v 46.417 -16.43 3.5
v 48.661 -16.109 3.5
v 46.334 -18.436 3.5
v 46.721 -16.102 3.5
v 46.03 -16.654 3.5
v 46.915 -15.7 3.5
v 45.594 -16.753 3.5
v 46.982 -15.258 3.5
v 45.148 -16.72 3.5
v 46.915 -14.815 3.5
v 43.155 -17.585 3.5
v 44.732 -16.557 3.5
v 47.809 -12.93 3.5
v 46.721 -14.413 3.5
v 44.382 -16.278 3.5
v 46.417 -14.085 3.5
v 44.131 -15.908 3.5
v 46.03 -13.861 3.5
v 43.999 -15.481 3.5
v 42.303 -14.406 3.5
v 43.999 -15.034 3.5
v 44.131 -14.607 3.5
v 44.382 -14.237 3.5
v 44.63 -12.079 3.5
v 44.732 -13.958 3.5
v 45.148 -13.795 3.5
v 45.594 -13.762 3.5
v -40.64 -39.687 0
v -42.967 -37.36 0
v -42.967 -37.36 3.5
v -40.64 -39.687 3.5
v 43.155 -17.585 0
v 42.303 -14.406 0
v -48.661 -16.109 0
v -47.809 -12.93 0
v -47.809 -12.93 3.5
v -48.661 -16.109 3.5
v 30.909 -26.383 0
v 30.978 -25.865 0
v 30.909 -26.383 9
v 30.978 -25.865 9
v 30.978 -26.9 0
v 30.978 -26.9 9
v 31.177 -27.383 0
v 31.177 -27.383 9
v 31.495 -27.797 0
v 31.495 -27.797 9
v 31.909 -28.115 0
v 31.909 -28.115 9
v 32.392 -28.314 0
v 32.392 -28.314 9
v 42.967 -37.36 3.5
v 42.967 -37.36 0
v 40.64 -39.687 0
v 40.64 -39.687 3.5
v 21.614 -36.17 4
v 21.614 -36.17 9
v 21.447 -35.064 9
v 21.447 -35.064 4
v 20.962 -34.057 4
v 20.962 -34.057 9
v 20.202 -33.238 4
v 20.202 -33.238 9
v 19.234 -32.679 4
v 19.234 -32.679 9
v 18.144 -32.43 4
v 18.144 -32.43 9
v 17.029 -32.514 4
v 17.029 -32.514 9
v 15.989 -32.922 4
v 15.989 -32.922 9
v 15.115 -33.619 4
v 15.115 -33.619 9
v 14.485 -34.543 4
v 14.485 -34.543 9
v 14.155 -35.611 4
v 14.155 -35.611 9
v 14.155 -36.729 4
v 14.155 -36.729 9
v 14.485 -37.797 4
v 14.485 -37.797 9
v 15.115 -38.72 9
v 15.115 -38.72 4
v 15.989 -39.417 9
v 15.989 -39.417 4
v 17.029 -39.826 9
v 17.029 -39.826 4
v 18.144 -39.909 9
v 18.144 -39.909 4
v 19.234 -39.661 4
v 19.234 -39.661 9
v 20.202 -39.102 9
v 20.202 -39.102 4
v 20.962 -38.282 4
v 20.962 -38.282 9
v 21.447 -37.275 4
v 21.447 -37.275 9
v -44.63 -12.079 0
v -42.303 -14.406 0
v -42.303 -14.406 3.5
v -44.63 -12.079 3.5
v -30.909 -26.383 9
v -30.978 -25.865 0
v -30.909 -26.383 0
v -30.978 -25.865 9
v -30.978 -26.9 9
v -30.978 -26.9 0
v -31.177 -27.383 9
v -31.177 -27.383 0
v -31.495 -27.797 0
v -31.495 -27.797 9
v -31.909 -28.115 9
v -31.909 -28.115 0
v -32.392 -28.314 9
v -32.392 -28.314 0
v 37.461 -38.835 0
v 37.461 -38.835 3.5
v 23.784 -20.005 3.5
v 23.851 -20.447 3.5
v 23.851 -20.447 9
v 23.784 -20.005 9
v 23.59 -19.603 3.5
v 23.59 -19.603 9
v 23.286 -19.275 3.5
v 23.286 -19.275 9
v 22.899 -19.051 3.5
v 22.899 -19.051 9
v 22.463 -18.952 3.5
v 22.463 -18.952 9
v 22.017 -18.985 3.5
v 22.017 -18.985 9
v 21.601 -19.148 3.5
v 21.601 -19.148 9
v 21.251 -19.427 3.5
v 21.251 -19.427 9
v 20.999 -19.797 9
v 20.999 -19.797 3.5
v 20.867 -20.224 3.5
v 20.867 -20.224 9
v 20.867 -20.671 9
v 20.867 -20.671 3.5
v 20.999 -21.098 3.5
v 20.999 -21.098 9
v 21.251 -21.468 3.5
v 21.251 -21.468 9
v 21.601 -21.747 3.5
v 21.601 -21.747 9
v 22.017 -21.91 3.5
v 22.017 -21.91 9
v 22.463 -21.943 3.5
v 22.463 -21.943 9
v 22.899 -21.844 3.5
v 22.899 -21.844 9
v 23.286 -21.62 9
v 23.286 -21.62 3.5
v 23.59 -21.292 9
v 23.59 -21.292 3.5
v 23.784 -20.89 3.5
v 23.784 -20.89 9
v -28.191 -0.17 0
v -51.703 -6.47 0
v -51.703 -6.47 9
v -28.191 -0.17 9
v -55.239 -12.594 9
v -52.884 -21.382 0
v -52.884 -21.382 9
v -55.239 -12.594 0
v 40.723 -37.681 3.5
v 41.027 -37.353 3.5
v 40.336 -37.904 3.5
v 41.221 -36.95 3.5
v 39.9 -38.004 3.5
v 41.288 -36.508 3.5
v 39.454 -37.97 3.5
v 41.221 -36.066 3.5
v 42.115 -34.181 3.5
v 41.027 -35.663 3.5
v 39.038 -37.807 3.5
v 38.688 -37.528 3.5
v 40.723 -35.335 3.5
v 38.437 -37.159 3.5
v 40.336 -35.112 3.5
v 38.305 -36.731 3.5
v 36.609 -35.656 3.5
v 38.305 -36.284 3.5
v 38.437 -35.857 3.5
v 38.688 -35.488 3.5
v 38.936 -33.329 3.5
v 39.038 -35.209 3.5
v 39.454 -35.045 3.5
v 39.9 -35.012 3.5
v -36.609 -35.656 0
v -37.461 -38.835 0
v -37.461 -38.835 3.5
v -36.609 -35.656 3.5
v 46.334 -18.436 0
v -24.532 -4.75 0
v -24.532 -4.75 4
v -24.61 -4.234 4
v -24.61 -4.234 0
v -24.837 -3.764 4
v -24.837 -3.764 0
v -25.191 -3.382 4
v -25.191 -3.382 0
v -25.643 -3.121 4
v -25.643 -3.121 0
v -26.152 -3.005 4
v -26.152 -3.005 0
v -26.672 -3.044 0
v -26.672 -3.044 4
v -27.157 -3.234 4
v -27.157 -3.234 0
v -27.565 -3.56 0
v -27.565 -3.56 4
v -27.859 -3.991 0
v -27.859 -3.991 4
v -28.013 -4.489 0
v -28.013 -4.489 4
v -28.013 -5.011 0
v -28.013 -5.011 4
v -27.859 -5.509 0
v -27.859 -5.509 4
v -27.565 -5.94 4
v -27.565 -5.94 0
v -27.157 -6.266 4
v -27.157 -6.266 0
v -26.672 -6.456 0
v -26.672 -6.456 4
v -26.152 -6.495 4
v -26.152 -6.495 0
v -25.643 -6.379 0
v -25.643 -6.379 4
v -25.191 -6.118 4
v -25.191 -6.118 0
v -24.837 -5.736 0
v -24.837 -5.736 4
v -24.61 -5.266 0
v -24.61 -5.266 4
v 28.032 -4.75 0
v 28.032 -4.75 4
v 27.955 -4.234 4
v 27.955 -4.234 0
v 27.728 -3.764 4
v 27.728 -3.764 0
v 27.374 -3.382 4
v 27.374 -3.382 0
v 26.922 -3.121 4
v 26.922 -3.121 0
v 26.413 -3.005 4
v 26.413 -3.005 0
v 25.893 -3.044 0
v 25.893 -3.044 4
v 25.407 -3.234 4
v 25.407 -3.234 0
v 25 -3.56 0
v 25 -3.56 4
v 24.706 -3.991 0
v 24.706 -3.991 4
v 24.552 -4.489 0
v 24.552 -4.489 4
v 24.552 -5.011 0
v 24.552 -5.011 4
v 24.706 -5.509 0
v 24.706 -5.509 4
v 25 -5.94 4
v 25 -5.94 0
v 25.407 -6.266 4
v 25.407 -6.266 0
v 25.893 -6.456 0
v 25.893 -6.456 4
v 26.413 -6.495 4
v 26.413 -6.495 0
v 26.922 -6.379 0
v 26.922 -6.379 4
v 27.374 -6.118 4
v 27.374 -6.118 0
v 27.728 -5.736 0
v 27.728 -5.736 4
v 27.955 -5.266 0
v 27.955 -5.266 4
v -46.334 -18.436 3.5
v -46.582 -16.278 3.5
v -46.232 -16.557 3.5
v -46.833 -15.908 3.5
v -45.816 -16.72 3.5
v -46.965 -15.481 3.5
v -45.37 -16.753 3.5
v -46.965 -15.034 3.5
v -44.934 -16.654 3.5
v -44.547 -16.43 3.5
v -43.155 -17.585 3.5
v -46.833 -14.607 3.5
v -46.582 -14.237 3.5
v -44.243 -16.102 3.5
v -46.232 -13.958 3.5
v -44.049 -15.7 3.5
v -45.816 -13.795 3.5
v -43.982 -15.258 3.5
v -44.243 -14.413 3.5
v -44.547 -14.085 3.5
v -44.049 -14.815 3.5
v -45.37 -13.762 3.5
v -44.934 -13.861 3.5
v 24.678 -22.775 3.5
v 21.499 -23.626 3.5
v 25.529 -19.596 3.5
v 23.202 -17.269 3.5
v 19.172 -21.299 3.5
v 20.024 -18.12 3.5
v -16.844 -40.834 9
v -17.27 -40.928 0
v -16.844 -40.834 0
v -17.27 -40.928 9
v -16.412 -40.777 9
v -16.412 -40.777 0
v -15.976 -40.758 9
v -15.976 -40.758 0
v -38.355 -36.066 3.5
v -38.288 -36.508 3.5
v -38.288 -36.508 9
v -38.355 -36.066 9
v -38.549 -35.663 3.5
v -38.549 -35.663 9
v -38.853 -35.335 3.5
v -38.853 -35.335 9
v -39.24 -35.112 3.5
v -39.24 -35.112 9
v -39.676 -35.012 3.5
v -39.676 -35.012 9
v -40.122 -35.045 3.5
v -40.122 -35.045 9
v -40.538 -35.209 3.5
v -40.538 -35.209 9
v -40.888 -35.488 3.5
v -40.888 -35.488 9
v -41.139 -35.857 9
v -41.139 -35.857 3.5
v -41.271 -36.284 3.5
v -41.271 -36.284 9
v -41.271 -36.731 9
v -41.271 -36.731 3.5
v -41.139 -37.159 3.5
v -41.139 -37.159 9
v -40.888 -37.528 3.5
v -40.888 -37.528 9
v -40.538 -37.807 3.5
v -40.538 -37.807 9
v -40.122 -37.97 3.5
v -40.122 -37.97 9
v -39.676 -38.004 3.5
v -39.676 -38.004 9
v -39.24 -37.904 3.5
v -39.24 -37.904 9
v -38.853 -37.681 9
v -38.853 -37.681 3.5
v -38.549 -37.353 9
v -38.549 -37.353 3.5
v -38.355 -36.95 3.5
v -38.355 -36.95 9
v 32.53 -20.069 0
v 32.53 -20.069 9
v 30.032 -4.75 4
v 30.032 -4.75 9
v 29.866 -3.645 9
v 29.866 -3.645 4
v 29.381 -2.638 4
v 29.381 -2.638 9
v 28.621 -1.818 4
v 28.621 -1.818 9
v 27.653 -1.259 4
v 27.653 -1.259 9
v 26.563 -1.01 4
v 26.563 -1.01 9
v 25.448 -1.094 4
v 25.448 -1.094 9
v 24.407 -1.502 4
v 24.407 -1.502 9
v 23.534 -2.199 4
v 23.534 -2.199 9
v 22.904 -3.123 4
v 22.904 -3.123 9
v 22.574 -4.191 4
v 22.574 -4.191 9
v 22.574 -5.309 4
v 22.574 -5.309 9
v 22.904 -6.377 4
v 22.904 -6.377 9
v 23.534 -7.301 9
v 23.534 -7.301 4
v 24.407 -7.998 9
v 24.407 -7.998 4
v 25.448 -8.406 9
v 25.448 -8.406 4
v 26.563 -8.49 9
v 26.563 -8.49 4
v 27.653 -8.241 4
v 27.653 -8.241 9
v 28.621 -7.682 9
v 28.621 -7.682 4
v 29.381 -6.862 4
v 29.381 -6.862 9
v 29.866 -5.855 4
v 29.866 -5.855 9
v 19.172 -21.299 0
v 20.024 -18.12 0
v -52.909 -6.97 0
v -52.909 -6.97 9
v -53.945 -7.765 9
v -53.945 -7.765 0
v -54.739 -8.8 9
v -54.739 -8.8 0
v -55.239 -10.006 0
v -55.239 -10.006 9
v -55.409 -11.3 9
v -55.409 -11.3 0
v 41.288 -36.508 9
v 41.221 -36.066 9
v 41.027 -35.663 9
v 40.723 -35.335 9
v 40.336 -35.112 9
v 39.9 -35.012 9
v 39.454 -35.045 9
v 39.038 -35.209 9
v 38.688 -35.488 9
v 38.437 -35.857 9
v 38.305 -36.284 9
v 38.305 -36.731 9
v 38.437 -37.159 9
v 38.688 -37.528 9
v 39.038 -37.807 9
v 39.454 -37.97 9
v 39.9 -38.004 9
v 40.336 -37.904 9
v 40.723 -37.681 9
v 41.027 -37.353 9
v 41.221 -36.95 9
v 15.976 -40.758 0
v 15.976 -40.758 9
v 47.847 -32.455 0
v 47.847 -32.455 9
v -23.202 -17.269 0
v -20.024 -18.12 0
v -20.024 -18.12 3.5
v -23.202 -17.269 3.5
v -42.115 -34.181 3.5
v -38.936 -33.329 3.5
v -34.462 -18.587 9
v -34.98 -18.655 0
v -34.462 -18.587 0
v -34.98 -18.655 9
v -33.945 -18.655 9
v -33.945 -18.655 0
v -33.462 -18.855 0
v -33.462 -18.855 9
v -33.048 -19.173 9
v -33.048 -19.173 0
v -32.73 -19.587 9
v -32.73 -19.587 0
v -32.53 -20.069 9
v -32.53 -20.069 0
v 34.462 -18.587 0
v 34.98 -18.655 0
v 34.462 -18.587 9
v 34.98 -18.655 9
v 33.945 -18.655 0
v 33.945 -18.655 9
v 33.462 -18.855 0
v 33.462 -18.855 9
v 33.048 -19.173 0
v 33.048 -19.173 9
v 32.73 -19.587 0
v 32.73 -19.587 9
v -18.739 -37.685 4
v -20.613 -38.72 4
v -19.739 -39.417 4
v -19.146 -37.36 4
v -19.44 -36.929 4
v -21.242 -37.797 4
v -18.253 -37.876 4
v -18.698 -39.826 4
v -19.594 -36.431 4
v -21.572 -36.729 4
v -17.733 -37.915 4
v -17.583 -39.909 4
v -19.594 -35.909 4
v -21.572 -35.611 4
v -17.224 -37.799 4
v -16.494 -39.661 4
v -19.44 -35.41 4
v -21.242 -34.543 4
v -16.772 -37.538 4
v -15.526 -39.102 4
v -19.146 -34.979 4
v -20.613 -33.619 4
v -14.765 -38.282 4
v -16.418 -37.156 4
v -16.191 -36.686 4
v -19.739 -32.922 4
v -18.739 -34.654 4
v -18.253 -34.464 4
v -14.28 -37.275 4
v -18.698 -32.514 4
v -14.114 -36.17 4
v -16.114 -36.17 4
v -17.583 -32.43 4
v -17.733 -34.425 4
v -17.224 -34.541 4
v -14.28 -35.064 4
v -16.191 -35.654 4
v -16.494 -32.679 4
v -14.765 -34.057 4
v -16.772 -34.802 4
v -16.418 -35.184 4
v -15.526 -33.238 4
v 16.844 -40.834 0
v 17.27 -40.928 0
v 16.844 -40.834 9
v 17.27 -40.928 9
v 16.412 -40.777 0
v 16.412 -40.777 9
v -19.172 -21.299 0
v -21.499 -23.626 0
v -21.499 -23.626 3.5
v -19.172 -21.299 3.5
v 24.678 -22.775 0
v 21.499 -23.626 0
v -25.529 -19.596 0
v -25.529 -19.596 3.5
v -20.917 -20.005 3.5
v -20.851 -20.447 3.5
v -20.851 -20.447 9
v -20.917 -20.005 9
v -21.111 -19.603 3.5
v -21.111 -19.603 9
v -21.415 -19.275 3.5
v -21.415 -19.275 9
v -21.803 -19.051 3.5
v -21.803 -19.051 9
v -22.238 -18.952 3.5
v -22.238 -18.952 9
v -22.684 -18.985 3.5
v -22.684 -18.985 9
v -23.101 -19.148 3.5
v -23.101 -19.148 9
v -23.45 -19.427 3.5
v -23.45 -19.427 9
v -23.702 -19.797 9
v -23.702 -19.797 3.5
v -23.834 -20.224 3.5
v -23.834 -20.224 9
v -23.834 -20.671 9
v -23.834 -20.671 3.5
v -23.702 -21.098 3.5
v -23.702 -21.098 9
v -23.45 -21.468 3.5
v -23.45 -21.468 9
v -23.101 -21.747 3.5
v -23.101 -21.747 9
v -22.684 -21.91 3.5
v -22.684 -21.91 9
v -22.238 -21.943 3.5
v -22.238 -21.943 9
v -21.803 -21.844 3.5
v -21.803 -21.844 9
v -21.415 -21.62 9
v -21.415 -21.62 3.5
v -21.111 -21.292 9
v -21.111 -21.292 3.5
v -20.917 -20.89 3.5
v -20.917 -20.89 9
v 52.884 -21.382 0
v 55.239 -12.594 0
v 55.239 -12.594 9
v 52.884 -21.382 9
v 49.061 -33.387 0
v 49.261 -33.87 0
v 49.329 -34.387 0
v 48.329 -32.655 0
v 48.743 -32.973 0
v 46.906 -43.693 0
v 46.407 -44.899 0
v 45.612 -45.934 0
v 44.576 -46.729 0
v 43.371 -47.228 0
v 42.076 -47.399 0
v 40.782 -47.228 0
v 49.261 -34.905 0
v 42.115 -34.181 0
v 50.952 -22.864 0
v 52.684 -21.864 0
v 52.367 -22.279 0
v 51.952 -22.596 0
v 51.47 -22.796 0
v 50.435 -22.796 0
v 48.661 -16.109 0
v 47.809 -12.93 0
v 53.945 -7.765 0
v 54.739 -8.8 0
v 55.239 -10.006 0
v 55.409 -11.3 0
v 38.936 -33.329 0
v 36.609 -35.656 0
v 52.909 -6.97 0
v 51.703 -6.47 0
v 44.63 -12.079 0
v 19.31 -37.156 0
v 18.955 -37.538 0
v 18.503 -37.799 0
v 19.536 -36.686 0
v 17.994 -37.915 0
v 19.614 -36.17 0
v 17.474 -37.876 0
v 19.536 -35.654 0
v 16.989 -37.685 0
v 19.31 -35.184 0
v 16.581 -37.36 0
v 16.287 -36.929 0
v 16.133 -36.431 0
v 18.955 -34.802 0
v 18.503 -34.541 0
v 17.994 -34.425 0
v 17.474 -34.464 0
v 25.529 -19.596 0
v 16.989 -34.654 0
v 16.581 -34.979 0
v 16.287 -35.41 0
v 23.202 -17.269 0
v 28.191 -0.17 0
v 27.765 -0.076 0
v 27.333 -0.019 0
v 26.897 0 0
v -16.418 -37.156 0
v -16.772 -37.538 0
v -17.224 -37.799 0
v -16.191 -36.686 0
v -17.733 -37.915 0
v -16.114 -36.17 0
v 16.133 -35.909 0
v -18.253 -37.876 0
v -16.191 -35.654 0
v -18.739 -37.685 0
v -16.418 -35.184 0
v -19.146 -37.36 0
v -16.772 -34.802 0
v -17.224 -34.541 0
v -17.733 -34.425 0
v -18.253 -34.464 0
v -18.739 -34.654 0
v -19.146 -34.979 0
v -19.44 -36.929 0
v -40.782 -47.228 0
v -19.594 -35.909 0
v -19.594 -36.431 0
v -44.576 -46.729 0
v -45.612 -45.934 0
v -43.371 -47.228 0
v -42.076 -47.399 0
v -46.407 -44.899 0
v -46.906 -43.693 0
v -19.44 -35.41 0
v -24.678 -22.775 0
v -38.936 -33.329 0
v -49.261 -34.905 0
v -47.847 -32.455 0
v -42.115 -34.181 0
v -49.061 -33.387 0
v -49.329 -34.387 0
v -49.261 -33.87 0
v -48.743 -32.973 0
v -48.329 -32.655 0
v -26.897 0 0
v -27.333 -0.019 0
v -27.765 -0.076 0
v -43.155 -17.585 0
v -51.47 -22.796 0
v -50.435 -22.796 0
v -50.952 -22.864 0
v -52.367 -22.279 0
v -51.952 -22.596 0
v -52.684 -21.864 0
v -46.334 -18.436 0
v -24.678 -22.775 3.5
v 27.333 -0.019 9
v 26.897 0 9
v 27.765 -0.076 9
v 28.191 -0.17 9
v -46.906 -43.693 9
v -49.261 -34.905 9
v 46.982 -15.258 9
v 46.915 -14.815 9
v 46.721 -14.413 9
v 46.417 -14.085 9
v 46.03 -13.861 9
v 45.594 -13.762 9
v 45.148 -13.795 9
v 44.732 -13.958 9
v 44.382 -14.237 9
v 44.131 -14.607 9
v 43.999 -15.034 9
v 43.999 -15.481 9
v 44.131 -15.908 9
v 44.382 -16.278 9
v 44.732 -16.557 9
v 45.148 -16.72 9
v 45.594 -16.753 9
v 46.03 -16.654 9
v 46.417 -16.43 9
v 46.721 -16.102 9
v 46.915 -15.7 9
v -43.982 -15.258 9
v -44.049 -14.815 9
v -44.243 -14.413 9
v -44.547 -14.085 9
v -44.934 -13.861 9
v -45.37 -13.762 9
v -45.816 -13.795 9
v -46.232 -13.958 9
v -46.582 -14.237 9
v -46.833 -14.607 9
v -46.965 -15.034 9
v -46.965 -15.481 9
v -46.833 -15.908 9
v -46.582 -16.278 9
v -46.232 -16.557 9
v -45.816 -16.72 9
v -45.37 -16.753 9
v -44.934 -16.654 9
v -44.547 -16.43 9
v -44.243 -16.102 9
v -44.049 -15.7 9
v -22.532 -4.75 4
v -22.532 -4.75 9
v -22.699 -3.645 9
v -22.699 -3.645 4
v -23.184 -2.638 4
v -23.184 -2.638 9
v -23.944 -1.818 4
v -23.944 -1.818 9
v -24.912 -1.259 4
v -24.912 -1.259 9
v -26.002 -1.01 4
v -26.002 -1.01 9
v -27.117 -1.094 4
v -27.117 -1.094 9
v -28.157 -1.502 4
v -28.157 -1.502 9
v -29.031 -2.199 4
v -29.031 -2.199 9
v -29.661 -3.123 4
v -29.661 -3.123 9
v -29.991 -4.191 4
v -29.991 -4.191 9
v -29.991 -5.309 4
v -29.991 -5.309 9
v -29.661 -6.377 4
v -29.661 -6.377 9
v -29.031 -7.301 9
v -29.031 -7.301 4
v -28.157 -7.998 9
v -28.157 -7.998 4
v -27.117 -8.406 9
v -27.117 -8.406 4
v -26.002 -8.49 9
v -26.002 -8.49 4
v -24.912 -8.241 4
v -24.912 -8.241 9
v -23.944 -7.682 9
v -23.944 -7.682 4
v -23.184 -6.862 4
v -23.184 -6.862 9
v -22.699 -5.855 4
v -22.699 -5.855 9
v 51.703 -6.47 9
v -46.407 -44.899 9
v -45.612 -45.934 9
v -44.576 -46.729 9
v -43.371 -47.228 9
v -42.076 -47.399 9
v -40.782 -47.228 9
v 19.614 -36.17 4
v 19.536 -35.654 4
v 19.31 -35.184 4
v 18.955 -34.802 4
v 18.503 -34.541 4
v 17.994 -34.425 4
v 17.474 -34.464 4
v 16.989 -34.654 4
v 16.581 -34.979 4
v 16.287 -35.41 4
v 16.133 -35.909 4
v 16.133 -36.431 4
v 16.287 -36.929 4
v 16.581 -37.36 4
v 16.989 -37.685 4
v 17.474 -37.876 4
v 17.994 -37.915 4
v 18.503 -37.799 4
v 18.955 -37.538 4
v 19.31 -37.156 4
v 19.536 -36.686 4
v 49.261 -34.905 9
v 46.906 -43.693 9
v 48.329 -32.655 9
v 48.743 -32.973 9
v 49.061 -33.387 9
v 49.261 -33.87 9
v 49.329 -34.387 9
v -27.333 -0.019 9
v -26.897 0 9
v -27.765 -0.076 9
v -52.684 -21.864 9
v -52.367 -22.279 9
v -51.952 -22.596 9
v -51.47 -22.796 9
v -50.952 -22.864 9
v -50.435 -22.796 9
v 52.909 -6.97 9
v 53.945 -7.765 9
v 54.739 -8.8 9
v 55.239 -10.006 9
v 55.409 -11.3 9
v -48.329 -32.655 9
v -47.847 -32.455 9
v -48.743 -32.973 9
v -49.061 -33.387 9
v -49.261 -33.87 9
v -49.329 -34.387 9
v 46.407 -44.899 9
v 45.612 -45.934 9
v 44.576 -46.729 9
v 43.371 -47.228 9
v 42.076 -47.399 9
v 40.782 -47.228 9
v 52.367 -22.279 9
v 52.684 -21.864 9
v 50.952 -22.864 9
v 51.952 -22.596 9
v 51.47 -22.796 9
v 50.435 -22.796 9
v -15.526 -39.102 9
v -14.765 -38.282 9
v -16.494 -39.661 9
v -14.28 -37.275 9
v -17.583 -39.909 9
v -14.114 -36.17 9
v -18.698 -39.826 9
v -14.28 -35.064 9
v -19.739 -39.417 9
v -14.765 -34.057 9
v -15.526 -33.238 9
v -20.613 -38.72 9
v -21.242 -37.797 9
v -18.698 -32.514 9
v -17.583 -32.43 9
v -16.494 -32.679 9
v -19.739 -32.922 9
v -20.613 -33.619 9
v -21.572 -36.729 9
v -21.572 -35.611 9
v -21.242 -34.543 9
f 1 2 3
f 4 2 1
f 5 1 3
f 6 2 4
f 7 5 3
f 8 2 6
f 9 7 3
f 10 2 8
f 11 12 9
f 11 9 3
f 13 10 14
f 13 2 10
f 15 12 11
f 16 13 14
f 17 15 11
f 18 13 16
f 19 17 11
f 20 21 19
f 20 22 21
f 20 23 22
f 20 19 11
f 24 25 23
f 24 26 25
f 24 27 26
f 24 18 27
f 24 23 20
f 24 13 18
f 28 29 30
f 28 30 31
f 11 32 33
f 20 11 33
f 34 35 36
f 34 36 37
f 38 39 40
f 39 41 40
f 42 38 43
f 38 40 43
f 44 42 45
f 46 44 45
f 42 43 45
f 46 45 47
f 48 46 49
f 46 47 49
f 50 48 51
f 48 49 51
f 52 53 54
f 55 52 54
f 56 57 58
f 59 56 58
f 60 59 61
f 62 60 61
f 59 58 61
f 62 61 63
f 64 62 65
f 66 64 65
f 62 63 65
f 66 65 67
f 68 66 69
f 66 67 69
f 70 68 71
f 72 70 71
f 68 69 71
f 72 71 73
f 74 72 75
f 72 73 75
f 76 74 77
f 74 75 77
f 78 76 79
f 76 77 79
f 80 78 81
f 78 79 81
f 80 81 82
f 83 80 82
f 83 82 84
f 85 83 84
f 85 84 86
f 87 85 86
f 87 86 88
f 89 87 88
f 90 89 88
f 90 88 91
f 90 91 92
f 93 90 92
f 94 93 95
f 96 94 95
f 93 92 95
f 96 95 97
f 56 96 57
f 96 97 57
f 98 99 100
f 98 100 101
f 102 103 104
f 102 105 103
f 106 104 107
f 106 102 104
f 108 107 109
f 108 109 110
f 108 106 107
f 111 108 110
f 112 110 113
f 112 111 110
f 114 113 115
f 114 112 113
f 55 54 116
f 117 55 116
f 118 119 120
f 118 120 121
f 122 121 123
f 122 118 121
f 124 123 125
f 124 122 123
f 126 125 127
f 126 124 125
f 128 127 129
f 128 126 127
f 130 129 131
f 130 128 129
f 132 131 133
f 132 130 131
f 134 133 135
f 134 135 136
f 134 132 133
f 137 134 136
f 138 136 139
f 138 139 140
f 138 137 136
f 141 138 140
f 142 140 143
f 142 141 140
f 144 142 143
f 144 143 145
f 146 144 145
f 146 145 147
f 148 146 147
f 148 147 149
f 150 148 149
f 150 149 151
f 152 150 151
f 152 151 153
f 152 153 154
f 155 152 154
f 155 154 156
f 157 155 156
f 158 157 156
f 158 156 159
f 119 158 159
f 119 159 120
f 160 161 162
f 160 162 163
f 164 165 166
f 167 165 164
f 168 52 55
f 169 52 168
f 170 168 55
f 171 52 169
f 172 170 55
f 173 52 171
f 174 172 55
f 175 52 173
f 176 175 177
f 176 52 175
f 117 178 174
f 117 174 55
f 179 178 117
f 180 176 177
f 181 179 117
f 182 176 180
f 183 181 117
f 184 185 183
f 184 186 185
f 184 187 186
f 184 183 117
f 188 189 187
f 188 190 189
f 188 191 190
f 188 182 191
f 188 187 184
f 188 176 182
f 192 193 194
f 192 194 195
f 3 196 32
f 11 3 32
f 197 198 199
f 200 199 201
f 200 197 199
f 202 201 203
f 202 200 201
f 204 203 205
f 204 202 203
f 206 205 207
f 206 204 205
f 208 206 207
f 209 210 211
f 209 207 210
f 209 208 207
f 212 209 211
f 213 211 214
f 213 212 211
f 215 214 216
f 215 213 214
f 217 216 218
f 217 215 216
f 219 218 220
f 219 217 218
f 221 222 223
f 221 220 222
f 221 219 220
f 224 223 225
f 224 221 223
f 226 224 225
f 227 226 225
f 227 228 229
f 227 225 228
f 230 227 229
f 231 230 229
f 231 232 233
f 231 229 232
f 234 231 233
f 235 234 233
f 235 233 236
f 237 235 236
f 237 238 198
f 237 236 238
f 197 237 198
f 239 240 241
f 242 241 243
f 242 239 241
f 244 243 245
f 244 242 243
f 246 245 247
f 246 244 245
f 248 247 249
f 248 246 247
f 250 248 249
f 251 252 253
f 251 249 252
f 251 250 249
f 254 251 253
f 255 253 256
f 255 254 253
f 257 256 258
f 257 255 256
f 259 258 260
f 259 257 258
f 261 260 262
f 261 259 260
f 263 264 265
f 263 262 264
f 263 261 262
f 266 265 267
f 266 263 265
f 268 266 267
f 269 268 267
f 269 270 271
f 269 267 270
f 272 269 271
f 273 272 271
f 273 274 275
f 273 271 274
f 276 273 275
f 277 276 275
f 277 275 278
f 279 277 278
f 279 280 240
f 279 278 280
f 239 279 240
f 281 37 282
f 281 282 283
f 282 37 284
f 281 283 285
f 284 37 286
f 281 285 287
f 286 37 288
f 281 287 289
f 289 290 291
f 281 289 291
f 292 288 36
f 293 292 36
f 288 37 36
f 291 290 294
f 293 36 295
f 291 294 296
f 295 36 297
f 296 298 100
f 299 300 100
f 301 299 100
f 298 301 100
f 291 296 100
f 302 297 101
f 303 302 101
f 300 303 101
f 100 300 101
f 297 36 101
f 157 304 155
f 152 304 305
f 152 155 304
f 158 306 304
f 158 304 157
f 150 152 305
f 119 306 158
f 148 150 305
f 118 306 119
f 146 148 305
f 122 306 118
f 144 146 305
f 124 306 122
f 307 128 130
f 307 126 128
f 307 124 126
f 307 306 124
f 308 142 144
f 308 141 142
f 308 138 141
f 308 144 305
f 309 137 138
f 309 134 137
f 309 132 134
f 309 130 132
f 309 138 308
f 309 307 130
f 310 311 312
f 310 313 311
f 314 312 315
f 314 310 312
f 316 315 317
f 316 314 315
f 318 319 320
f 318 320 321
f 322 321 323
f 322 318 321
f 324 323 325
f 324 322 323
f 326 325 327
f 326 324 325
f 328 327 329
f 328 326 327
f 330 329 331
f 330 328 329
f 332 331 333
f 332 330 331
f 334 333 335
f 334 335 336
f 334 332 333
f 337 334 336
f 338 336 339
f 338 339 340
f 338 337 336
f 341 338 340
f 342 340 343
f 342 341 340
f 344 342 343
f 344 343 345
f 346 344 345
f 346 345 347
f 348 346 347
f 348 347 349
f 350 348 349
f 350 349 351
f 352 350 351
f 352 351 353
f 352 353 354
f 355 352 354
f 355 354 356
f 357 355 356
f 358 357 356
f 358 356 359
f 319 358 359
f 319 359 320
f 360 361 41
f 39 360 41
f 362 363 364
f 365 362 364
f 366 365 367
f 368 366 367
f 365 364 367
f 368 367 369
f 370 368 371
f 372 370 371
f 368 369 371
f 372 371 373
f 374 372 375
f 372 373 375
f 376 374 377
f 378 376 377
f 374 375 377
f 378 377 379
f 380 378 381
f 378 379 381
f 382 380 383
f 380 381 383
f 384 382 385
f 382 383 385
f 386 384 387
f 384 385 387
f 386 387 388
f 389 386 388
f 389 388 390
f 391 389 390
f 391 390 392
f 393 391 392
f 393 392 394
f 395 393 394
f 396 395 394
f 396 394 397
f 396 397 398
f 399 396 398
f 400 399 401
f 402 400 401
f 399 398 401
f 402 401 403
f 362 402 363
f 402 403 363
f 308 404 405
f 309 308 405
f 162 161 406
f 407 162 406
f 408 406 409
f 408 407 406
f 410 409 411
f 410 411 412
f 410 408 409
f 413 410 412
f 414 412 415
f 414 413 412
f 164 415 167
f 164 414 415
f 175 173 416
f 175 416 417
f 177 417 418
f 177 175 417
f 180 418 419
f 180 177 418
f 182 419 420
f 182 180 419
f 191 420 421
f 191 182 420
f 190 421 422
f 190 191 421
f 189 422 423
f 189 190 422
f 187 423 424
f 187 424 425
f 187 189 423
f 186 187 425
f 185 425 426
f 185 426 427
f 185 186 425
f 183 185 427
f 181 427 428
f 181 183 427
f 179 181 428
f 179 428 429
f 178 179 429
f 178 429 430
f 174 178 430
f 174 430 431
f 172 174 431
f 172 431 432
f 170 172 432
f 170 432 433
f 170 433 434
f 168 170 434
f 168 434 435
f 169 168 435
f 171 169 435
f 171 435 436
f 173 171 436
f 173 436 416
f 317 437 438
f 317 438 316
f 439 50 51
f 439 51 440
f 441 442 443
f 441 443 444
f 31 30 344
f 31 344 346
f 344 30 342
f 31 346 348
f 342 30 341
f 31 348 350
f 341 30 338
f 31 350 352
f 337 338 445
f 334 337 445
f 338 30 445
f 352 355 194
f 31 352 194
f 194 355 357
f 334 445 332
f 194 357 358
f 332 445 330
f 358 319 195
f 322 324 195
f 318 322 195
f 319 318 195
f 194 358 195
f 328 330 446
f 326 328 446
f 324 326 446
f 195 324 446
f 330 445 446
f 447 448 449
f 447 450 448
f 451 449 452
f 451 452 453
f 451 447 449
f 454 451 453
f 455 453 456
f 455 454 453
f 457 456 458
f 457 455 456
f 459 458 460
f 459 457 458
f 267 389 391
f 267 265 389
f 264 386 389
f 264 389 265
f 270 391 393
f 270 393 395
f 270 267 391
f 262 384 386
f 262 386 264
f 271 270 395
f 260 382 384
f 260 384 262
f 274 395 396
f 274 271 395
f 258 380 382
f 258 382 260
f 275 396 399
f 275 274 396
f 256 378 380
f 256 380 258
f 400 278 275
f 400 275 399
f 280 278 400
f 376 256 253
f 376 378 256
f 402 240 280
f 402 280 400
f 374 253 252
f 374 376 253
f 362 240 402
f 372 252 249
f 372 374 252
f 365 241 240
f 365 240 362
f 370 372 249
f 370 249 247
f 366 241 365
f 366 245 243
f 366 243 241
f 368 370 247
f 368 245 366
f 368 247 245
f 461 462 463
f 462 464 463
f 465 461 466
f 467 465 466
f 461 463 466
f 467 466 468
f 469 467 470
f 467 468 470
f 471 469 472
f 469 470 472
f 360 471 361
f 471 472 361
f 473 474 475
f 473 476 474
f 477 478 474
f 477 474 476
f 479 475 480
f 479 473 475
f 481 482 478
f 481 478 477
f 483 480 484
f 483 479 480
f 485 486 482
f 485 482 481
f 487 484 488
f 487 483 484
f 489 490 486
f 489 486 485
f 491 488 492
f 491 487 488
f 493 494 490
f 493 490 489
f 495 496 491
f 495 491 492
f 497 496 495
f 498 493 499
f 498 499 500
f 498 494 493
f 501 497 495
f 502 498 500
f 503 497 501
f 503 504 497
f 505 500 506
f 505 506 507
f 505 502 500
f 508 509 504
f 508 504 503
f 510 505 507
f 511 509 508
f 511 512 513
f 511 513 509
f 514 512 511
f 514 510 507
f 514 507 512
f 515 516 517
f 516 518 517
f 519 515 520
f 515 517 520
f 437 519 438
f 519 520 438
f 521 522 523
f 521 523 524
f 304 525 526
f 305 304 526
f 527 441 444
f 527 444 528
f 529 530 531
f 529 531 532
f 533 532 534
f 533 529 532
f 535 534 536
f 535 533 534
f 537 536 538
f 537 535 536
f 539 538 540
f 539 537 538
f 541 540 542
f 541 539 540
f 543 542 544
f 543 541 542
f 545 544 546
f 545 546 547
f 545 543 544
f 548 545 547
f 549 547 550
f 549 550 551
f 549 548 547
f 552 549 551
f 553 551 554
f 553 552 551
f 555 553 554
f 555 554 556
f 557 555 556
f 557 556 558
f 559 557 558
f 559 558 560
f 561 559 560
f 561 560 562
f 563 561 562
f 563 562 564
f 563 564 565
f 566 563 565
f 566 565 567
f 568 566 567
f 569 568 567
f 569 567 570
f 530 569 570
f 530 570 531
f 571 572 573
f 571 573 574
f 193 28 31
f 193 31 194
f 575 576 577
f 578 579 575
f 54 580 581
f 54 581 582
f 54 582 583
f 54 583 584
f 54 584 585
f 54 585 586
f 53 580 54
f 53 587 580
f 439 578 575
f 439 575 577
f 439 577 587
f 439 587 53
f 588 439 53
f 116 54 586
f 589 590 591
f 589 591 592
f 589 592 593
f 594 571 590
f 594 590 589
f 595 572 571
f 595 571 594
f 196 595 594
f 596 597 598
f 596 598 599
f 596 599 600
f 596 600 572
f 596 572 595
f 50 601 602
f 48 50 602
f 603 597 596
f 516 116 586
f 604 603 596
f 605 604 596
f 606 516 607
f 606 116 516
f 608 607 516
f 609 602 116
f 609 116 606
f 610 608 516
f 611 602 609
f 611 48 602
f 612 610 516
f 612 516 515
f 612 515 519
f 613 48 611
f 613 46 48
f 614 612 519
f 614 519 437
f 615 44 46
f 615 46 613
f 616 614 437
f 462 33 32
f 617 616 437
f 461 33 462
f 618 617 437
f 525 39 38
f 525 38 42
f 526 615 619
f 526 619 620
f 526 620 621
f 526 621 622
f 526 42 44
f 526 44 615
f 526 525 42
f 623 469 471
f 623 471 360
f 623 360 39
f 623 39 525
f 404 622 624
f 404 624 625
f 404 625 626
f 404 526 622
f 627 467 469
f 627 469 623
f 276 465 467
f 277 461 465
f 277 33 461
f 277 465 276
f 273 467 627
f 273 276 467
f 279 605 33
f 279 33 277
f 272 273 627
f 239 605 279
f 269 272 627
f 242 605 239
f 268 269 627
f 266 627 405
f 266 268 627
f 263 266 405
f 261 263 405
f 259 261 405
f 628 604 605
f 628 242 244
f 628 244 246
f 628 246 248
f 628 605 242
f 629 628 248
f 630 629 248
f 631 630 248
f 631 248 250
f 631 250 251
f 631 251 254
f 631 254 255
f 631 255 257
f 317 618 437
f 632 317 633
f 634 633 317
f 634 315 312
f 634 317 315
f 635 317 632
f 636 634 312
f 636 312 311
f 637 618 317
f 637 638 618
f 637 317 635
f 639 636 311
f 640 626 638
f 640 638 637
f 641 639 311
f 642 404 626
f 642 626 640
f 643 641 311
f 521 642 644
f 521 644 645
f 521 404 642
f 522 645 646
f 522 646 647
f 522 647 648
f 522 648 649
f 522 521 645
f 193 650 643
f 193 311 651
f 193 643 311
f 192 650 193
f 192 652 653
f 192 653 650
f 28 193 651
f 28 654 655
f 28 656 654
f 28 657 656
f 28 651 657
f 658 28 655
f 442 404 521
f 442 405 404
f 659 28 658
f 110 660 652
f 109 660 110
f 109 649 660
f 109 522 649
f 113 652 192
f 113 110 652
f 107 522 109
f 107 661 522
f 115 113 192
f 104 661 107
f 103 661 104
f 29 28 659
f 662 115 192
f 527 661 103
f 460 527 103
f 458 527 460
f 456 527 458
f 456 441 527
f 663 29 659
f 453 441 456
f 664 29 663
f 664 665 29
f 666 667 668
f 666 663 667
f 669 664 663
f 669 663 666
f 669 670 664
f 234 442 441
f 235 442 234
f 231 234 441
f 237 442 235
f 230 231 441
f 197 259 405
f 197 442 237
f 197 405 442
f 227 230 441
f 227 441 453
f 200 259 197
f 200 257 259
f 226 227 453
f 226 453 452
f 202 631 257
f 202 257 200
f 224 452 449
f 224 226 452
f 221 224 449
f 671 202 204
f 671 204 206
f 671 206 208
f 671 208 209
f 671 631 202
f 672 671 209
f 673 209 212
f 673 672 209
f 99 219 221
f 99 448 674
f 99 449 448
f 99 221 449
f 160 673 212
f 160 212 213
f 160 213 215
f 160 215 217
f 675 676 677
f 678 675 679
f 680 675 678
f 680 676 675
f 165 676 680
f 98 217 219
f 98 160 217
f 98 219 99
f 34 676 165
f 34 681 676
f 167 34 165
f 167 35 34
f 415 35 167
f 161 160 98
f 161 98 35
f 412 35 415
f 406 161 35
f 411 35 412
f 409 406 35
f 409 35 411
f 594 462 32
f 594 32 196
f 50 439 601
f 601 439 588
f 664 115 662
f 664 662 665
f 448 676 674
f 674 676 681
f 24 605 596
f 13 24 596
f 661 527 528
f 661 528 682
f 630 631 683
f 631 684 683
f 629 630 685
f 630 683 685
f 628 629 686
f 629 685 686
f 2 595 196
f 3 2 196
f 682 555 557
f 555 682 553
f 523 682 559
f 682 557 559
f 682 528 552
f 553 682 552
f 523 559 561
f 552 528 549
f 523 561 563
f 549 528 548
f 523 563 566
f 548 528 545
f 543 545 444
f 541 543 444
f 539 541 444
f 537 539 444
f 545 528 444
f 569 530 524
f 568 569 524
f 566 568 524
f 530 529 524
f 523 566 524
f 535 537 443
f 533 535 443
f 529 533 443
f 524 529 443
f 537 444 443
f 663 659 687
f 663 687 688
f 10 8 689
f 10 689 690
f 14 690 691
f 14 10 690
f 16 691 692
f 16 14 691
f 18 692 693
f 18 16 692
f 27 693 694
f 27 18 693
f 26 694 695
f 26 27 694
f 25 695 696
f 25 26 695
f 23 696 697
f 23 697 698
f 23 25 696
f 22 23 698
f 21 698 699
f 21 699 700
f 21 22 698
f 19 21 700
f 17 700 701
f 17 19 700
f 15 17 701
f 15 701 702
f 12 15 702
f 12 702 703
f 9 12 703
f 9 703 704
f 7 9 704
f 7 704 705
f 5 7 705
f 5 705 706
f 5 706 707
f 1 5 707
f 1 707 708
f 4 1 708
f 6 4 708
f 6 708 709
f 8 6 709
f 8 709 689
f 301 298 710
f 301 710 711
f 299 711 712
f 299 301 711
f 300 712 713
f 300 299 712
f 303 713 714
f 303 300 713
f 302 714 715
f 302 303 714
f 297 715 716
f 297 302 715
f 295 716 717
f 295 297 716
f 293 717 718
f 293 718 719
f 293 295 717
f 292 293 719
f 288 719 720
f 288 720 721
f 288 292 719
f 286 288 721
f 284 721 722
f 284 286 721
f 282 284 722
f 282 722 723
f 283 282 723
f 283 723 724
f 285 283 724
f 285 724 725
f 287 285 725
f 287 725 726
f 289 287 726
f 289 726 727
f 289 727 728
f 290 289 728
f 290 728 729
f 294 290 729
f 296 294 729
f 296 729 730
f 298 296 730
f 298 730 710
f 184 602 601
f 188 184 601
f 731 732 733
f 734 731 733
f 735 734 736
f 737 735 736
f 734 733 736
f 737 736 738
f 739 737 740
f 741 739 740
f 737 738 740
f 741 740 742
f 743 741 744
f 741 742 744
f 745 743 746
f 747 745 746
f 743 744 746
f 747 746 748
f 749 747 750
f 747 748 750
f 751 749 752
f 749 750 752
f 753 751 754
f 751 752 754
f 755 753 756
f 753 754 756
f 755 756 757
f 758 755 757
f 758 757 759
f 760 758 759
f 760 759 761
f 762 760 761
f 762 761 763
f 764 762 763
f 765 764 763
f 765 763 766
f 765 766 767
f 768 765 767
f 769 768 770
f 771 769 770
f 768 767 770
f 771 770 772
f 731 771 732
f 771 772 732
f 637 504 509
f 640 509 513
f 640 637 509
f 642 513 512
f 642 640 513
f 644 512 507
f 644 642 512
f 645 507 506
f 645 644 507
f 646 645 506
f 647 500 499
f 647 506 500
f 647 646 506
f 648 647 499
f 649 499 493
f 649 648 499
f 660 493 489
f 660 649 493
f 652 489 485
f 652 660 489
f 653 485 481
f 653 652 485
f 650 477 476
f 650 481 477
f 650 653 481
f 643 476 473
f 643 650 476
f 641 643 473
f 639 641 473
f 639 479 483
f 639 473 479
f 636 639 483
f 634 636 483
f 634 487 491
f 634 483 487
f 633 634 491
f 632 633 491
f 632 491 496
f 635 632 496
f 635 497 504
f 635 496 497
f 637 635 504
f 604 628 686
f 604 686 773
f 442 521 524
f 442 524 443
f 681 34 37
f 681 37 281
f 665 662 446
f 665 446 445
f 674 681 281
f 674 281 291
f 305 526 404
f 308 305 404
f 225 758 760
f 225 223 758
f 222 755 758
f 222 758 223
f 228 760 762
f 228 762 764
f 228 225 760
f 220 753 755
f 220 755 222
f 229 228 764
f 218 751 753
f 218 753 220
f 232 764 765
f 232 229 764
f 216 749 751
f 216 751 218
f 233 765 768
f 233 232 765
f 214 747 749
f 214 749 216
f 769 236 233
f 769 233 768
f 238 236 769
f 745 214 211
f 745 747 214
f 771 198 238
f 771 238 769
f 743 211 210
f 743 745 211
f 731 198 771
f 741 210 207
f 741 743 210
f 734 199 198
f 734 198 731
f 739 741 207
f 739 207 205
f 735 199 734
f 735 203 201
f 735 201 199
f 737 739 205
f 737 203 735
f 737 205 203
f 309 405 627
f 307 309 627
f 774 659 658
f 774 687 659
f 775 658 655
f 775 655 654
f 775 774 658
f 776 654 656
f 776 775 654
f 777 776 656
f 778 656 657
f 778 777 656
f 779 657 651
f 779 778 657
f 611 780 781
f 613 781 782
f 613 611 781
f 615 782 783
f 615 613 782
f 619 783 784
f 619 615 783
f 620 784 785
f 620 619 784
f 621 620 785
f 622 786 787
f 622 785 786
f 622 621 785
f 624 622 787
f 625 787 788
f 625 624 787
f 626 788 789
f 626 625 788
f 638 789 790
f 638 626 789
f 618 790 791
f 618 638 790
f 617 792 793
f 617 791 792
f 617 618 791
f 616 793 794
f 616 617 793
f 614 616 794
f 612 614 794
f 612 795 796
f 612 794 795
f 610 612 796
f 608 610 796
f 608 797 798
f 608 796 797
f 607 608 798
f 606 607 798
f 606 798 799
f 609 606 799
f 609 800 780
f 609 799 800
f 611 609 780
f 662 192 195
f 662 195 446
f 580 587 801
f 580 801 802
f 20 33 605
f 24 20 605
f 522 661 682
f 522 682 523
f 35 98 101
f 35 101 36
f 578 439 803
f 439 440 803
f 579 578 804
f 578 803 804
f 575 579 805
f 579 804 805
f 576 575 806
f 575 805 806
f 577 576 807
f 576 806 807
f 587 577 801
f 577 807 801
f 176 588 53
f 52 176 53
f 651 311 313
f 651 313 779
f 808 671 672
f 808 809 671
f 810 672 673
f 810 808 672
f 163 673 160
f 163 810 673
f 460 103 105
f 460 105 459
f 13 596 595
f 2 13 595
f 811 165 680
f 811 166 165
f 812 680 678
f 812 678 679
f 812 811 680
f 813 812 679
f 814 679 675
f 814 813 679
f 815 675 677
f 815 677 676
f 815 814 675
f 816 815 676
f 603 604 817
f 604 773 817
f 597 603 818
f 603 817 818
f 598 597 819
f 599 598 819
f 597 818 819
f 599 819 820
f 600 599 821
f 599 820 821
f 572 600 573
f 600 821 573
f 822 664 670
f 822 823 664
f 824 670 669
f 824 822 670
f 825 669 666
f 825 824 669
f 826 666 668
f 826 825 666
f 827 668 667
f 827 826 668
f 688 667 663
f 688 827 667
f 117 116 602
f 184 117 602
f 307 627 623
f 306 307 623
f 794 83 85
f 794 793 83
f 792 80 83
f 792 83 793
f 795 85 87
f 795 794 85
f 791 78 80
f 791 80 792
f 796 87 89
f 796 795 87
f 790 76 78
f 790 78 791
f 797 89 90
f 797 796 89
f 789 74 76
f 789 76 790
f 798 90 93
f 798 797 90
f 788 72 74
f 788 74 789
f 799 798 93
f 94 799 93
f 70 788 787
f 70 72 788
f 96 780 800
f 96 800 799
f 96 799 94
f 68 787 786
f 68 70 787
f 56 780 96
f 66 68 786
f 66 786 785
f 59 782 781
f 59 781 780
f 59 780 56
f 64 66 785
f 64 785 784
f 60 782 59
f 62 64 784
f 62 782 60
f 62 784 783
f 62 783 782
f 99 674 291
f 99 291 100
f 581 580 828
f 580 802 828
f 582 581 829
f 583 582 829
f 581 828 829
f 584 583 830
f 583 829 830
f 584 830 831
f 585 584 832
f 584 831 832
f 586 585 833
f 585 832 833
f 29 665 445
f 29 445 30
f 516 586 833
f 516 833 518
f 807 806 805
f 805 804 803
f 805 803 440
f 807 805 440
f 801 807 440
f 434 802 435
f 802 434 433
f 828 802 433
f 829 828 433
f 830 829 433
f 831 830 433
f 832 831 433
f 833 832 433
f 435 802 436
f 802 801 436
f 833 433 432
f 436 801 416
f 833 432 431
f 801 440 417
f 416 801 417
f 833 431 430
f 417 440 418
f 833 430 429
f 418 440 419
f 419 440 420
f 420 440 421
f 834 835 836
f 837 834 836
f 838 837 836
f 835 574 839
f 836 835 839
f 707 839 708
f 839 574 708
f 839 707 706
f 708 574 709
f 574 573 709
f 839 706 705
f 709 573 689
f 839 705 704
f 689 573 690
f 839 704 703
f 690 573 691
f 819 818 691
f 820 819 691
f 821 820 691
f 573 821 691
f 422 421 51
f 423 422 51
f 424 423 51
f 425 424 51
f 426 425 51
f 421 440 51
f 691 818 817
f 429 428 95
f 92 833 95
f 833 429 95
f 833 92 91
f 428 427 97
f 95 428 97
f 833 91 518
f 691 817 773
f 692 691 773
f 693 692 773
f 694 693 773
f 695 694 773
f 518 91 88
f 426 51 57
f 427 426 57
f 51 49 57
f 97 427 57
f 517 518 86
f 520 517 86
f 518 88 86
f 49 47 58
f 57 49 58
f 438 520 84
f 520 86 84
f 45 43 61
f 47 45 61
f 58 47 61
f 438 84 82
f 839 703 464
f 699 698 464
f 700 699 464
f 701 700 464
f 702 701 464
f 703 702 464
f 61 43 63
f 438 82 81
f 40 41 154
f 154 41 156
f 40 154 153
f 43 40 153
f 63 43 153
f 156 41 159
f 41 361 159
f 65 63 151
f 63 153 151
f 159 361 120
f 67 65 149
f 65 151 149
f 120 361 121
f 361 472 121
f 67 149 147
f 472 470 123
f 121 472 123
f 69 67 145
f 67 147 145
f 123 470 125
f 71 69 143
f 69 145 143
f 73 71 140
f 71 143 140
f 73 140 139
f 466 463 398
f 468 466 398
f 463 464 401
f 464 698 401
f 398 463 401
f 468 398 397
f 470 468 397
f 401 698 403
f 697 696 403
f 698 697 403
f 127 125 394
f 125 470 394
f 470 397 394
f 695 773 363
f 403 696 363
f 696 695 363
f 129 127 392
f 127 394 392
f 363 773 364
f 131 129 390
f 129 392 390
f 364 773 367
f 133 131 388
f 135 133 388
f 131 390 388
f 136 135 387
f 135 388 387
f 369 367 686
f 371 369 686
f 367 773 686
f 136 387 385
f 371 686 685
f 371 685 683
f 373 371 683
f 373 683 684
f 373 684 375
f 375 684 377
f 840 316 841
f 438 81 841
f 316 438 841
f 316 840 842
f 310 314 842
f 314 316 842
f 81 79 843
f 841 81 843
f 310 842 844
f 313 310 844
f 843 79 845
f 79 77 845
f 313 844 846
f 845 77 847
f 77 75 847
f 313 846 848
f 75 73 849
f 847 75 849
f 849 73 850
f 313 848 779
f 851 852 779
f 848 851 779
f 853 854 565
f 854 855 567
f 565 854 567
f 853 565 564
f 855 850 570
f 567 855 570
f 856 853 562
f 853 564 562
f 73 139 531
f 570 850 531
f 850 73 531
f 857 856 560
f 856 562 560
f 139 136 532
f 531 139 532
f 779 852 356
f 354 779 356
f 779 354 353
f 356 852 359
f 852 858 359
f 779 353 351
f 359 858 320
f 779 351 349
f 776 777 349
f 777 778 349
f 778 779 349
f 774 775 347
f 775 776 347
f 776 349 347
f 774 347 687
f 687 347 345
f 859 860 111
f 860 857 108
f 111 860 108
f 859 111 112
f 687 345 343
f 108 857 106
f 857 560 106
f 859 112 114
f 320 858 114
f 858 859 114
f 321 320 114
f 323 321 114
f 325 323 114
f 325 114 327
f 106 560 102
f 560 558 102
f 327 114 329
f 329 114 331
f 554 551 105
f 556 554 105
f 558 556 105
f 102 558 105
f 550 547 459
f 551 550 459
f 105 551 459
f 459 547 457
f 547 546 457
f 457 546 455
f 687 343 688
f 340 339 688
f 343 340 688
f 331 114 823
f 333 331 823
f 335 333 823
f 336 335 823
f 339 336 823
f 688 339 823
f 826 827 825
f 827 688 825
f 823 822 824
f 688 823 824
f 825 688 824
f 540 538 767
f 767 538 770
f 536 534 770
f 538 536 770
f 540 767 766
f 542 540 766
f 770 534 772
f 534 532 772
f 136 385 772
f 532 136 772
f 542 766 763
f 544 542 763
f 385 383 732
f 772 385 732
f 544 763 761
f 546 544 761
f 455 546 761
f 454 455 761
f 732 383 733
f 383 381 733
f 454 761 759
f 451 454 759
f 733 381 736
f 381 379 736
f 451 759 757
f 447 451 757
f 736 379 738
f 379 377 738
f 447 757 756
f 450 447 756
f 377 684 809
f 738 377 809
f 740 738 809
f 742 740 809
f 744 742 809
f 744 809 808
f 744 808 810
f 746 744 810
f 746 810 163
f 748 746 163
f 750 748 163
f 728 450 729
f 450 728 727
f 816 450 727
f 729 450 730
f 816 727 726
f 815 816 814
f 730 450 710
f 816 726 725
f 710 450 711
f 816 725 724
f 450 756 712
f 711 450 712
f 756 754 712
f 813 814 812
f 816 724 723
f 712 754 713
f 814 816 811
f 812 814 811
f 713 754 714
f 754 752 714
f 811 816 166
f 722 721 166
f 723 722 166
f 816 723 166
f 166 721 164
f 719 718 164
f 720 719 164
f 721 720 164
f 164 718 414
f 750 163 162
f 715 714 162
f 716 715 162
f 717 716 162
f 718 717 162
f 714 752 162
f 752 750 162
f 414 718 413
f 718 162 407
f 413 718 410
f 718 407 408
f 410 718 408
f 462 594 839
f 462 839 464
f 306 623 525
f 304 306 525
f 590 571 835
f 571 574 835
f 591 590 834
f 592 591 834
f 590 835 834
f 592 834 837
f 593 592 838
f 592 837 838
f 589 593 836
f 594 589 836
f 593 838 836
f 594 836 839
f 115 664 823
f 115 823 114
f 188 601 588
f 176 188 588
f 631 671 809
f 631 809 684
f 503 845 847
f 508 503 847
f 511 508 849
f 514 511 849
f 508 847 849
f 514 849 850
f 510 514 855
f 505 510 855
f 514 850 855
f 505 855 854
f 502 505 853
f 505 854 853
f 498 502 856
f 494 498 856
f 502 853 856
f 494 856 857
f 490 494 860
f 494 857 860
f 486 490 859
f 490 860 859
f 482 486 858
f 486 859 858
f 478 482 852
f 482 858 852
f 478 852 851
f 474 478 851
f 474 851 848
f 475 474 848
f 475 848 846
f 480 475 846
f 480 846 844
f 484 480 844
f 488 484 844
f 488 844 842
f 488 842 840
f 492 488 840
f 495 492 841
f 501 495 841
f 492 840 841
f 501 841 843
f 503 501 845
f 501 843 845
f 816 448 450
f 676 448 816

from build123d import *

# Parameters (mm, degrees)
SKETCH_1_R          = 1.75
SKETCH_1_R_2        = 1.5
EXTRUDE_1_DEPTH     = 9
FILLET_1_R          = 5
CUT_EXTRUDE_1_DEPTH = 3.5
SKETCH_5_R          = 3.75
CUT_EXTRUDE_2_DEPTH = 5
FILLET_2_R          = 2


with BuildPart() as part:
    # 草图1 → 凸台-拉伸1 (new body)
    with BuildSketch(Plane.XY):
        Polygon((-27.555241702, 0), (27.555241702, 0), (56.53301649, -7.764571353), (52.366592329, -23.31387801), (33.048075803, -18.137497108), (30.459885352, -27.796755371), (49.778401878, -32.973136273), (45.611977716, -48.52244293), (16.634202927, -40.757871577), (-16.634202927, -40.757871577), (-45.611977716, -48.52244293), (-49.778401878, -32.973136273), (-30.459885352, -27.796755371), (-33.048075803, -18.137497108), (-52.366592329, -23.31387801), (-56.53301649, -7.764571353), align=None)
        with Locations((-26.282483038, -4.75)):
            Circle(SKETCH_1_R, mode=Mode.SUBTRACT)
        with Locations((-17.863593392, -36.169723902)):
            Circle(SKETCH_1_R, mode=Mode.SUBTRACT)
        with Locations((17.863593392, -36.169723902)):
            Circle(SKETCH_1_R, mode=Mode.SUBTRACT)
        with Locations((26.282483038, -4.75)):
            Circle(SKETCH_1_R, mode=Mode.SUBTRACT)
        with Locations((-45.482028723, -15.257507669)):
            Circle(SKETCH_1_R_2, mode=Mode.SUBTRACT)
        with Locations((-22.350576875, -20.447491811)):
            Circle(SKETCH_1_R_2, mode=Mode.SUBTRACT)
        with Locations((-39.788009731, -36.507875848)):
            Circle(SKETCH_1_R_2, mode=Mode.SUBTRACT)
        with Locations((45.482028723, -15.257507669)):
            Circle(SKETCH_1_R_2, mode=Mode.SUBTRACT)
        with Locations((39.788009731, -36.507875848)):
            Circle(SKETCH_1_R_2, mode=Mode.SUBTRACT)
        with Locations((22.350576875, -20.447491811)):
            Circle(SKETCH_1_R_2, mode=Mode.SUBTRACT)
    extrude(amount=EXTRUDE_1_DEPTH)

    # 圆角1
    fillet_1_edges = [part.edges().sort_by_distance(p)[0] for p in [
        (-45.611977716, -48.52244293, 4.5),
        (-56.53301649, -7.764571353, 4.5),
        (-27.555241702, 0, 4.5),
        (27.555241702, 0, 4.5),
        (56.53301649, -7.764571353, 4.5),
        (45.611977716, -48.52244293, 4.5),
        (16.634202927, -40.757871577, 4.5),
        (-16.634202927, -40.757871577, 4.5),
    ]]
    fillet(fillet_1_edges, radius=FILLET_1_R)

    # 草图2 → 切除-拉伸1 (cut)
    with BuildSketch(Plane(origin=(0, 0, 0), x_dir=(-1, 0, 0), z_dir=(0, 0, -1))):
        Polygon((-42.303266769, -14.405760971), (-44.630282024, -12.078745715), (-47.809043978, -12.930492414), (-48.660790677, -16.109254368), (-46.333775421, -18.436269623), (-43.155013467, -17.584522925), align=None)
        Polygon((-21.498830176, -23.626253766), (-19.17181492, -21.29923851), (-20.023561619, -18.120476556), (-23.202323573, -17.268729857), (-25.529338829, -19.595745113), (-24.67759213, -22.774507067), align=None)
        Polygon((-36.609247776, -35.656129149), (-38.936263032, -33.329113893), (-42.115024986, -34.180860592), (-42.966771685, -37.359622546), (-40.639756429, -39.686637802), (-37.460994475, -38.834891103), align=None)
        Polygon((37.460994475, -38.834891103), (36.609247776, -35.656129149), (38.936263032, -33.329113893), (42.115024986, -34.180860592), (42.966771685, -37.359622546), (40.639756429, -39.686637802), align=None)
        Polygon((43.155013467, -17.584522925), (42.303266769, -14.405760971), (44.630282024, -12.078745715), (47.809043978, -12.930492414), (48.660790677, -16.109254368), (46.333775421, -18.436269623), align=None)
        Polygon((24.67759213, -22.774507067), (21.498830176, -23.626253766), (19.17181492, -21.29923851), (20.023561619, -18.120476556), (23.202323573, -17.268729857), (25.529338829, -19.595745113), align=None)
    extrude(amount=-CUT_EXTRUDE_1_DEPTH, mode=Mode.SUBTRACT)

    # 草图5 → 切除-拉伸2 (cut)
    with BuildSketch(Plane.XY.offset(9)):
        with Locations((-26.282483038, -4.75)):
            Circle(SKETCH_5_R)
        with Locations((-17.863593392, -36.169723902)):
            Circle(SKETCH_5_R)
        with Locations((17.863593392, -36.169723902)):
            Circle(SKETCH_5_R)
        with Locations((26.282483038, -4.75)):
            Circle(SKETCH_5_R)
    extrude(amount=-CUT_EXTRUDE_2_DEPTH, mode=Mode.SUBTRACT)

    # 圆角2
    fillet_2_edges = [part.edges().sort_by_distance(p)[0] for p in [
        (-49.778401878, -32.973136273, 4.5),
        (-30.459885352, -27.796755371, 4.5),
        (-33.048075803, -18.137497108, 4.5),
        (-52.366592329, -23.31387801, 4.5),
        (52.366592329, -23.31387801, 4.5),
        (33.048075803, -18.137497108, 4.5),
        (30.459885352, -27.796755371, 4.5),
        (49.778401878, -32.973136273, 4.5),
    ]]
    fillet(fillet_2_edges, radius=FILLET_2_R)


solid = part.part
